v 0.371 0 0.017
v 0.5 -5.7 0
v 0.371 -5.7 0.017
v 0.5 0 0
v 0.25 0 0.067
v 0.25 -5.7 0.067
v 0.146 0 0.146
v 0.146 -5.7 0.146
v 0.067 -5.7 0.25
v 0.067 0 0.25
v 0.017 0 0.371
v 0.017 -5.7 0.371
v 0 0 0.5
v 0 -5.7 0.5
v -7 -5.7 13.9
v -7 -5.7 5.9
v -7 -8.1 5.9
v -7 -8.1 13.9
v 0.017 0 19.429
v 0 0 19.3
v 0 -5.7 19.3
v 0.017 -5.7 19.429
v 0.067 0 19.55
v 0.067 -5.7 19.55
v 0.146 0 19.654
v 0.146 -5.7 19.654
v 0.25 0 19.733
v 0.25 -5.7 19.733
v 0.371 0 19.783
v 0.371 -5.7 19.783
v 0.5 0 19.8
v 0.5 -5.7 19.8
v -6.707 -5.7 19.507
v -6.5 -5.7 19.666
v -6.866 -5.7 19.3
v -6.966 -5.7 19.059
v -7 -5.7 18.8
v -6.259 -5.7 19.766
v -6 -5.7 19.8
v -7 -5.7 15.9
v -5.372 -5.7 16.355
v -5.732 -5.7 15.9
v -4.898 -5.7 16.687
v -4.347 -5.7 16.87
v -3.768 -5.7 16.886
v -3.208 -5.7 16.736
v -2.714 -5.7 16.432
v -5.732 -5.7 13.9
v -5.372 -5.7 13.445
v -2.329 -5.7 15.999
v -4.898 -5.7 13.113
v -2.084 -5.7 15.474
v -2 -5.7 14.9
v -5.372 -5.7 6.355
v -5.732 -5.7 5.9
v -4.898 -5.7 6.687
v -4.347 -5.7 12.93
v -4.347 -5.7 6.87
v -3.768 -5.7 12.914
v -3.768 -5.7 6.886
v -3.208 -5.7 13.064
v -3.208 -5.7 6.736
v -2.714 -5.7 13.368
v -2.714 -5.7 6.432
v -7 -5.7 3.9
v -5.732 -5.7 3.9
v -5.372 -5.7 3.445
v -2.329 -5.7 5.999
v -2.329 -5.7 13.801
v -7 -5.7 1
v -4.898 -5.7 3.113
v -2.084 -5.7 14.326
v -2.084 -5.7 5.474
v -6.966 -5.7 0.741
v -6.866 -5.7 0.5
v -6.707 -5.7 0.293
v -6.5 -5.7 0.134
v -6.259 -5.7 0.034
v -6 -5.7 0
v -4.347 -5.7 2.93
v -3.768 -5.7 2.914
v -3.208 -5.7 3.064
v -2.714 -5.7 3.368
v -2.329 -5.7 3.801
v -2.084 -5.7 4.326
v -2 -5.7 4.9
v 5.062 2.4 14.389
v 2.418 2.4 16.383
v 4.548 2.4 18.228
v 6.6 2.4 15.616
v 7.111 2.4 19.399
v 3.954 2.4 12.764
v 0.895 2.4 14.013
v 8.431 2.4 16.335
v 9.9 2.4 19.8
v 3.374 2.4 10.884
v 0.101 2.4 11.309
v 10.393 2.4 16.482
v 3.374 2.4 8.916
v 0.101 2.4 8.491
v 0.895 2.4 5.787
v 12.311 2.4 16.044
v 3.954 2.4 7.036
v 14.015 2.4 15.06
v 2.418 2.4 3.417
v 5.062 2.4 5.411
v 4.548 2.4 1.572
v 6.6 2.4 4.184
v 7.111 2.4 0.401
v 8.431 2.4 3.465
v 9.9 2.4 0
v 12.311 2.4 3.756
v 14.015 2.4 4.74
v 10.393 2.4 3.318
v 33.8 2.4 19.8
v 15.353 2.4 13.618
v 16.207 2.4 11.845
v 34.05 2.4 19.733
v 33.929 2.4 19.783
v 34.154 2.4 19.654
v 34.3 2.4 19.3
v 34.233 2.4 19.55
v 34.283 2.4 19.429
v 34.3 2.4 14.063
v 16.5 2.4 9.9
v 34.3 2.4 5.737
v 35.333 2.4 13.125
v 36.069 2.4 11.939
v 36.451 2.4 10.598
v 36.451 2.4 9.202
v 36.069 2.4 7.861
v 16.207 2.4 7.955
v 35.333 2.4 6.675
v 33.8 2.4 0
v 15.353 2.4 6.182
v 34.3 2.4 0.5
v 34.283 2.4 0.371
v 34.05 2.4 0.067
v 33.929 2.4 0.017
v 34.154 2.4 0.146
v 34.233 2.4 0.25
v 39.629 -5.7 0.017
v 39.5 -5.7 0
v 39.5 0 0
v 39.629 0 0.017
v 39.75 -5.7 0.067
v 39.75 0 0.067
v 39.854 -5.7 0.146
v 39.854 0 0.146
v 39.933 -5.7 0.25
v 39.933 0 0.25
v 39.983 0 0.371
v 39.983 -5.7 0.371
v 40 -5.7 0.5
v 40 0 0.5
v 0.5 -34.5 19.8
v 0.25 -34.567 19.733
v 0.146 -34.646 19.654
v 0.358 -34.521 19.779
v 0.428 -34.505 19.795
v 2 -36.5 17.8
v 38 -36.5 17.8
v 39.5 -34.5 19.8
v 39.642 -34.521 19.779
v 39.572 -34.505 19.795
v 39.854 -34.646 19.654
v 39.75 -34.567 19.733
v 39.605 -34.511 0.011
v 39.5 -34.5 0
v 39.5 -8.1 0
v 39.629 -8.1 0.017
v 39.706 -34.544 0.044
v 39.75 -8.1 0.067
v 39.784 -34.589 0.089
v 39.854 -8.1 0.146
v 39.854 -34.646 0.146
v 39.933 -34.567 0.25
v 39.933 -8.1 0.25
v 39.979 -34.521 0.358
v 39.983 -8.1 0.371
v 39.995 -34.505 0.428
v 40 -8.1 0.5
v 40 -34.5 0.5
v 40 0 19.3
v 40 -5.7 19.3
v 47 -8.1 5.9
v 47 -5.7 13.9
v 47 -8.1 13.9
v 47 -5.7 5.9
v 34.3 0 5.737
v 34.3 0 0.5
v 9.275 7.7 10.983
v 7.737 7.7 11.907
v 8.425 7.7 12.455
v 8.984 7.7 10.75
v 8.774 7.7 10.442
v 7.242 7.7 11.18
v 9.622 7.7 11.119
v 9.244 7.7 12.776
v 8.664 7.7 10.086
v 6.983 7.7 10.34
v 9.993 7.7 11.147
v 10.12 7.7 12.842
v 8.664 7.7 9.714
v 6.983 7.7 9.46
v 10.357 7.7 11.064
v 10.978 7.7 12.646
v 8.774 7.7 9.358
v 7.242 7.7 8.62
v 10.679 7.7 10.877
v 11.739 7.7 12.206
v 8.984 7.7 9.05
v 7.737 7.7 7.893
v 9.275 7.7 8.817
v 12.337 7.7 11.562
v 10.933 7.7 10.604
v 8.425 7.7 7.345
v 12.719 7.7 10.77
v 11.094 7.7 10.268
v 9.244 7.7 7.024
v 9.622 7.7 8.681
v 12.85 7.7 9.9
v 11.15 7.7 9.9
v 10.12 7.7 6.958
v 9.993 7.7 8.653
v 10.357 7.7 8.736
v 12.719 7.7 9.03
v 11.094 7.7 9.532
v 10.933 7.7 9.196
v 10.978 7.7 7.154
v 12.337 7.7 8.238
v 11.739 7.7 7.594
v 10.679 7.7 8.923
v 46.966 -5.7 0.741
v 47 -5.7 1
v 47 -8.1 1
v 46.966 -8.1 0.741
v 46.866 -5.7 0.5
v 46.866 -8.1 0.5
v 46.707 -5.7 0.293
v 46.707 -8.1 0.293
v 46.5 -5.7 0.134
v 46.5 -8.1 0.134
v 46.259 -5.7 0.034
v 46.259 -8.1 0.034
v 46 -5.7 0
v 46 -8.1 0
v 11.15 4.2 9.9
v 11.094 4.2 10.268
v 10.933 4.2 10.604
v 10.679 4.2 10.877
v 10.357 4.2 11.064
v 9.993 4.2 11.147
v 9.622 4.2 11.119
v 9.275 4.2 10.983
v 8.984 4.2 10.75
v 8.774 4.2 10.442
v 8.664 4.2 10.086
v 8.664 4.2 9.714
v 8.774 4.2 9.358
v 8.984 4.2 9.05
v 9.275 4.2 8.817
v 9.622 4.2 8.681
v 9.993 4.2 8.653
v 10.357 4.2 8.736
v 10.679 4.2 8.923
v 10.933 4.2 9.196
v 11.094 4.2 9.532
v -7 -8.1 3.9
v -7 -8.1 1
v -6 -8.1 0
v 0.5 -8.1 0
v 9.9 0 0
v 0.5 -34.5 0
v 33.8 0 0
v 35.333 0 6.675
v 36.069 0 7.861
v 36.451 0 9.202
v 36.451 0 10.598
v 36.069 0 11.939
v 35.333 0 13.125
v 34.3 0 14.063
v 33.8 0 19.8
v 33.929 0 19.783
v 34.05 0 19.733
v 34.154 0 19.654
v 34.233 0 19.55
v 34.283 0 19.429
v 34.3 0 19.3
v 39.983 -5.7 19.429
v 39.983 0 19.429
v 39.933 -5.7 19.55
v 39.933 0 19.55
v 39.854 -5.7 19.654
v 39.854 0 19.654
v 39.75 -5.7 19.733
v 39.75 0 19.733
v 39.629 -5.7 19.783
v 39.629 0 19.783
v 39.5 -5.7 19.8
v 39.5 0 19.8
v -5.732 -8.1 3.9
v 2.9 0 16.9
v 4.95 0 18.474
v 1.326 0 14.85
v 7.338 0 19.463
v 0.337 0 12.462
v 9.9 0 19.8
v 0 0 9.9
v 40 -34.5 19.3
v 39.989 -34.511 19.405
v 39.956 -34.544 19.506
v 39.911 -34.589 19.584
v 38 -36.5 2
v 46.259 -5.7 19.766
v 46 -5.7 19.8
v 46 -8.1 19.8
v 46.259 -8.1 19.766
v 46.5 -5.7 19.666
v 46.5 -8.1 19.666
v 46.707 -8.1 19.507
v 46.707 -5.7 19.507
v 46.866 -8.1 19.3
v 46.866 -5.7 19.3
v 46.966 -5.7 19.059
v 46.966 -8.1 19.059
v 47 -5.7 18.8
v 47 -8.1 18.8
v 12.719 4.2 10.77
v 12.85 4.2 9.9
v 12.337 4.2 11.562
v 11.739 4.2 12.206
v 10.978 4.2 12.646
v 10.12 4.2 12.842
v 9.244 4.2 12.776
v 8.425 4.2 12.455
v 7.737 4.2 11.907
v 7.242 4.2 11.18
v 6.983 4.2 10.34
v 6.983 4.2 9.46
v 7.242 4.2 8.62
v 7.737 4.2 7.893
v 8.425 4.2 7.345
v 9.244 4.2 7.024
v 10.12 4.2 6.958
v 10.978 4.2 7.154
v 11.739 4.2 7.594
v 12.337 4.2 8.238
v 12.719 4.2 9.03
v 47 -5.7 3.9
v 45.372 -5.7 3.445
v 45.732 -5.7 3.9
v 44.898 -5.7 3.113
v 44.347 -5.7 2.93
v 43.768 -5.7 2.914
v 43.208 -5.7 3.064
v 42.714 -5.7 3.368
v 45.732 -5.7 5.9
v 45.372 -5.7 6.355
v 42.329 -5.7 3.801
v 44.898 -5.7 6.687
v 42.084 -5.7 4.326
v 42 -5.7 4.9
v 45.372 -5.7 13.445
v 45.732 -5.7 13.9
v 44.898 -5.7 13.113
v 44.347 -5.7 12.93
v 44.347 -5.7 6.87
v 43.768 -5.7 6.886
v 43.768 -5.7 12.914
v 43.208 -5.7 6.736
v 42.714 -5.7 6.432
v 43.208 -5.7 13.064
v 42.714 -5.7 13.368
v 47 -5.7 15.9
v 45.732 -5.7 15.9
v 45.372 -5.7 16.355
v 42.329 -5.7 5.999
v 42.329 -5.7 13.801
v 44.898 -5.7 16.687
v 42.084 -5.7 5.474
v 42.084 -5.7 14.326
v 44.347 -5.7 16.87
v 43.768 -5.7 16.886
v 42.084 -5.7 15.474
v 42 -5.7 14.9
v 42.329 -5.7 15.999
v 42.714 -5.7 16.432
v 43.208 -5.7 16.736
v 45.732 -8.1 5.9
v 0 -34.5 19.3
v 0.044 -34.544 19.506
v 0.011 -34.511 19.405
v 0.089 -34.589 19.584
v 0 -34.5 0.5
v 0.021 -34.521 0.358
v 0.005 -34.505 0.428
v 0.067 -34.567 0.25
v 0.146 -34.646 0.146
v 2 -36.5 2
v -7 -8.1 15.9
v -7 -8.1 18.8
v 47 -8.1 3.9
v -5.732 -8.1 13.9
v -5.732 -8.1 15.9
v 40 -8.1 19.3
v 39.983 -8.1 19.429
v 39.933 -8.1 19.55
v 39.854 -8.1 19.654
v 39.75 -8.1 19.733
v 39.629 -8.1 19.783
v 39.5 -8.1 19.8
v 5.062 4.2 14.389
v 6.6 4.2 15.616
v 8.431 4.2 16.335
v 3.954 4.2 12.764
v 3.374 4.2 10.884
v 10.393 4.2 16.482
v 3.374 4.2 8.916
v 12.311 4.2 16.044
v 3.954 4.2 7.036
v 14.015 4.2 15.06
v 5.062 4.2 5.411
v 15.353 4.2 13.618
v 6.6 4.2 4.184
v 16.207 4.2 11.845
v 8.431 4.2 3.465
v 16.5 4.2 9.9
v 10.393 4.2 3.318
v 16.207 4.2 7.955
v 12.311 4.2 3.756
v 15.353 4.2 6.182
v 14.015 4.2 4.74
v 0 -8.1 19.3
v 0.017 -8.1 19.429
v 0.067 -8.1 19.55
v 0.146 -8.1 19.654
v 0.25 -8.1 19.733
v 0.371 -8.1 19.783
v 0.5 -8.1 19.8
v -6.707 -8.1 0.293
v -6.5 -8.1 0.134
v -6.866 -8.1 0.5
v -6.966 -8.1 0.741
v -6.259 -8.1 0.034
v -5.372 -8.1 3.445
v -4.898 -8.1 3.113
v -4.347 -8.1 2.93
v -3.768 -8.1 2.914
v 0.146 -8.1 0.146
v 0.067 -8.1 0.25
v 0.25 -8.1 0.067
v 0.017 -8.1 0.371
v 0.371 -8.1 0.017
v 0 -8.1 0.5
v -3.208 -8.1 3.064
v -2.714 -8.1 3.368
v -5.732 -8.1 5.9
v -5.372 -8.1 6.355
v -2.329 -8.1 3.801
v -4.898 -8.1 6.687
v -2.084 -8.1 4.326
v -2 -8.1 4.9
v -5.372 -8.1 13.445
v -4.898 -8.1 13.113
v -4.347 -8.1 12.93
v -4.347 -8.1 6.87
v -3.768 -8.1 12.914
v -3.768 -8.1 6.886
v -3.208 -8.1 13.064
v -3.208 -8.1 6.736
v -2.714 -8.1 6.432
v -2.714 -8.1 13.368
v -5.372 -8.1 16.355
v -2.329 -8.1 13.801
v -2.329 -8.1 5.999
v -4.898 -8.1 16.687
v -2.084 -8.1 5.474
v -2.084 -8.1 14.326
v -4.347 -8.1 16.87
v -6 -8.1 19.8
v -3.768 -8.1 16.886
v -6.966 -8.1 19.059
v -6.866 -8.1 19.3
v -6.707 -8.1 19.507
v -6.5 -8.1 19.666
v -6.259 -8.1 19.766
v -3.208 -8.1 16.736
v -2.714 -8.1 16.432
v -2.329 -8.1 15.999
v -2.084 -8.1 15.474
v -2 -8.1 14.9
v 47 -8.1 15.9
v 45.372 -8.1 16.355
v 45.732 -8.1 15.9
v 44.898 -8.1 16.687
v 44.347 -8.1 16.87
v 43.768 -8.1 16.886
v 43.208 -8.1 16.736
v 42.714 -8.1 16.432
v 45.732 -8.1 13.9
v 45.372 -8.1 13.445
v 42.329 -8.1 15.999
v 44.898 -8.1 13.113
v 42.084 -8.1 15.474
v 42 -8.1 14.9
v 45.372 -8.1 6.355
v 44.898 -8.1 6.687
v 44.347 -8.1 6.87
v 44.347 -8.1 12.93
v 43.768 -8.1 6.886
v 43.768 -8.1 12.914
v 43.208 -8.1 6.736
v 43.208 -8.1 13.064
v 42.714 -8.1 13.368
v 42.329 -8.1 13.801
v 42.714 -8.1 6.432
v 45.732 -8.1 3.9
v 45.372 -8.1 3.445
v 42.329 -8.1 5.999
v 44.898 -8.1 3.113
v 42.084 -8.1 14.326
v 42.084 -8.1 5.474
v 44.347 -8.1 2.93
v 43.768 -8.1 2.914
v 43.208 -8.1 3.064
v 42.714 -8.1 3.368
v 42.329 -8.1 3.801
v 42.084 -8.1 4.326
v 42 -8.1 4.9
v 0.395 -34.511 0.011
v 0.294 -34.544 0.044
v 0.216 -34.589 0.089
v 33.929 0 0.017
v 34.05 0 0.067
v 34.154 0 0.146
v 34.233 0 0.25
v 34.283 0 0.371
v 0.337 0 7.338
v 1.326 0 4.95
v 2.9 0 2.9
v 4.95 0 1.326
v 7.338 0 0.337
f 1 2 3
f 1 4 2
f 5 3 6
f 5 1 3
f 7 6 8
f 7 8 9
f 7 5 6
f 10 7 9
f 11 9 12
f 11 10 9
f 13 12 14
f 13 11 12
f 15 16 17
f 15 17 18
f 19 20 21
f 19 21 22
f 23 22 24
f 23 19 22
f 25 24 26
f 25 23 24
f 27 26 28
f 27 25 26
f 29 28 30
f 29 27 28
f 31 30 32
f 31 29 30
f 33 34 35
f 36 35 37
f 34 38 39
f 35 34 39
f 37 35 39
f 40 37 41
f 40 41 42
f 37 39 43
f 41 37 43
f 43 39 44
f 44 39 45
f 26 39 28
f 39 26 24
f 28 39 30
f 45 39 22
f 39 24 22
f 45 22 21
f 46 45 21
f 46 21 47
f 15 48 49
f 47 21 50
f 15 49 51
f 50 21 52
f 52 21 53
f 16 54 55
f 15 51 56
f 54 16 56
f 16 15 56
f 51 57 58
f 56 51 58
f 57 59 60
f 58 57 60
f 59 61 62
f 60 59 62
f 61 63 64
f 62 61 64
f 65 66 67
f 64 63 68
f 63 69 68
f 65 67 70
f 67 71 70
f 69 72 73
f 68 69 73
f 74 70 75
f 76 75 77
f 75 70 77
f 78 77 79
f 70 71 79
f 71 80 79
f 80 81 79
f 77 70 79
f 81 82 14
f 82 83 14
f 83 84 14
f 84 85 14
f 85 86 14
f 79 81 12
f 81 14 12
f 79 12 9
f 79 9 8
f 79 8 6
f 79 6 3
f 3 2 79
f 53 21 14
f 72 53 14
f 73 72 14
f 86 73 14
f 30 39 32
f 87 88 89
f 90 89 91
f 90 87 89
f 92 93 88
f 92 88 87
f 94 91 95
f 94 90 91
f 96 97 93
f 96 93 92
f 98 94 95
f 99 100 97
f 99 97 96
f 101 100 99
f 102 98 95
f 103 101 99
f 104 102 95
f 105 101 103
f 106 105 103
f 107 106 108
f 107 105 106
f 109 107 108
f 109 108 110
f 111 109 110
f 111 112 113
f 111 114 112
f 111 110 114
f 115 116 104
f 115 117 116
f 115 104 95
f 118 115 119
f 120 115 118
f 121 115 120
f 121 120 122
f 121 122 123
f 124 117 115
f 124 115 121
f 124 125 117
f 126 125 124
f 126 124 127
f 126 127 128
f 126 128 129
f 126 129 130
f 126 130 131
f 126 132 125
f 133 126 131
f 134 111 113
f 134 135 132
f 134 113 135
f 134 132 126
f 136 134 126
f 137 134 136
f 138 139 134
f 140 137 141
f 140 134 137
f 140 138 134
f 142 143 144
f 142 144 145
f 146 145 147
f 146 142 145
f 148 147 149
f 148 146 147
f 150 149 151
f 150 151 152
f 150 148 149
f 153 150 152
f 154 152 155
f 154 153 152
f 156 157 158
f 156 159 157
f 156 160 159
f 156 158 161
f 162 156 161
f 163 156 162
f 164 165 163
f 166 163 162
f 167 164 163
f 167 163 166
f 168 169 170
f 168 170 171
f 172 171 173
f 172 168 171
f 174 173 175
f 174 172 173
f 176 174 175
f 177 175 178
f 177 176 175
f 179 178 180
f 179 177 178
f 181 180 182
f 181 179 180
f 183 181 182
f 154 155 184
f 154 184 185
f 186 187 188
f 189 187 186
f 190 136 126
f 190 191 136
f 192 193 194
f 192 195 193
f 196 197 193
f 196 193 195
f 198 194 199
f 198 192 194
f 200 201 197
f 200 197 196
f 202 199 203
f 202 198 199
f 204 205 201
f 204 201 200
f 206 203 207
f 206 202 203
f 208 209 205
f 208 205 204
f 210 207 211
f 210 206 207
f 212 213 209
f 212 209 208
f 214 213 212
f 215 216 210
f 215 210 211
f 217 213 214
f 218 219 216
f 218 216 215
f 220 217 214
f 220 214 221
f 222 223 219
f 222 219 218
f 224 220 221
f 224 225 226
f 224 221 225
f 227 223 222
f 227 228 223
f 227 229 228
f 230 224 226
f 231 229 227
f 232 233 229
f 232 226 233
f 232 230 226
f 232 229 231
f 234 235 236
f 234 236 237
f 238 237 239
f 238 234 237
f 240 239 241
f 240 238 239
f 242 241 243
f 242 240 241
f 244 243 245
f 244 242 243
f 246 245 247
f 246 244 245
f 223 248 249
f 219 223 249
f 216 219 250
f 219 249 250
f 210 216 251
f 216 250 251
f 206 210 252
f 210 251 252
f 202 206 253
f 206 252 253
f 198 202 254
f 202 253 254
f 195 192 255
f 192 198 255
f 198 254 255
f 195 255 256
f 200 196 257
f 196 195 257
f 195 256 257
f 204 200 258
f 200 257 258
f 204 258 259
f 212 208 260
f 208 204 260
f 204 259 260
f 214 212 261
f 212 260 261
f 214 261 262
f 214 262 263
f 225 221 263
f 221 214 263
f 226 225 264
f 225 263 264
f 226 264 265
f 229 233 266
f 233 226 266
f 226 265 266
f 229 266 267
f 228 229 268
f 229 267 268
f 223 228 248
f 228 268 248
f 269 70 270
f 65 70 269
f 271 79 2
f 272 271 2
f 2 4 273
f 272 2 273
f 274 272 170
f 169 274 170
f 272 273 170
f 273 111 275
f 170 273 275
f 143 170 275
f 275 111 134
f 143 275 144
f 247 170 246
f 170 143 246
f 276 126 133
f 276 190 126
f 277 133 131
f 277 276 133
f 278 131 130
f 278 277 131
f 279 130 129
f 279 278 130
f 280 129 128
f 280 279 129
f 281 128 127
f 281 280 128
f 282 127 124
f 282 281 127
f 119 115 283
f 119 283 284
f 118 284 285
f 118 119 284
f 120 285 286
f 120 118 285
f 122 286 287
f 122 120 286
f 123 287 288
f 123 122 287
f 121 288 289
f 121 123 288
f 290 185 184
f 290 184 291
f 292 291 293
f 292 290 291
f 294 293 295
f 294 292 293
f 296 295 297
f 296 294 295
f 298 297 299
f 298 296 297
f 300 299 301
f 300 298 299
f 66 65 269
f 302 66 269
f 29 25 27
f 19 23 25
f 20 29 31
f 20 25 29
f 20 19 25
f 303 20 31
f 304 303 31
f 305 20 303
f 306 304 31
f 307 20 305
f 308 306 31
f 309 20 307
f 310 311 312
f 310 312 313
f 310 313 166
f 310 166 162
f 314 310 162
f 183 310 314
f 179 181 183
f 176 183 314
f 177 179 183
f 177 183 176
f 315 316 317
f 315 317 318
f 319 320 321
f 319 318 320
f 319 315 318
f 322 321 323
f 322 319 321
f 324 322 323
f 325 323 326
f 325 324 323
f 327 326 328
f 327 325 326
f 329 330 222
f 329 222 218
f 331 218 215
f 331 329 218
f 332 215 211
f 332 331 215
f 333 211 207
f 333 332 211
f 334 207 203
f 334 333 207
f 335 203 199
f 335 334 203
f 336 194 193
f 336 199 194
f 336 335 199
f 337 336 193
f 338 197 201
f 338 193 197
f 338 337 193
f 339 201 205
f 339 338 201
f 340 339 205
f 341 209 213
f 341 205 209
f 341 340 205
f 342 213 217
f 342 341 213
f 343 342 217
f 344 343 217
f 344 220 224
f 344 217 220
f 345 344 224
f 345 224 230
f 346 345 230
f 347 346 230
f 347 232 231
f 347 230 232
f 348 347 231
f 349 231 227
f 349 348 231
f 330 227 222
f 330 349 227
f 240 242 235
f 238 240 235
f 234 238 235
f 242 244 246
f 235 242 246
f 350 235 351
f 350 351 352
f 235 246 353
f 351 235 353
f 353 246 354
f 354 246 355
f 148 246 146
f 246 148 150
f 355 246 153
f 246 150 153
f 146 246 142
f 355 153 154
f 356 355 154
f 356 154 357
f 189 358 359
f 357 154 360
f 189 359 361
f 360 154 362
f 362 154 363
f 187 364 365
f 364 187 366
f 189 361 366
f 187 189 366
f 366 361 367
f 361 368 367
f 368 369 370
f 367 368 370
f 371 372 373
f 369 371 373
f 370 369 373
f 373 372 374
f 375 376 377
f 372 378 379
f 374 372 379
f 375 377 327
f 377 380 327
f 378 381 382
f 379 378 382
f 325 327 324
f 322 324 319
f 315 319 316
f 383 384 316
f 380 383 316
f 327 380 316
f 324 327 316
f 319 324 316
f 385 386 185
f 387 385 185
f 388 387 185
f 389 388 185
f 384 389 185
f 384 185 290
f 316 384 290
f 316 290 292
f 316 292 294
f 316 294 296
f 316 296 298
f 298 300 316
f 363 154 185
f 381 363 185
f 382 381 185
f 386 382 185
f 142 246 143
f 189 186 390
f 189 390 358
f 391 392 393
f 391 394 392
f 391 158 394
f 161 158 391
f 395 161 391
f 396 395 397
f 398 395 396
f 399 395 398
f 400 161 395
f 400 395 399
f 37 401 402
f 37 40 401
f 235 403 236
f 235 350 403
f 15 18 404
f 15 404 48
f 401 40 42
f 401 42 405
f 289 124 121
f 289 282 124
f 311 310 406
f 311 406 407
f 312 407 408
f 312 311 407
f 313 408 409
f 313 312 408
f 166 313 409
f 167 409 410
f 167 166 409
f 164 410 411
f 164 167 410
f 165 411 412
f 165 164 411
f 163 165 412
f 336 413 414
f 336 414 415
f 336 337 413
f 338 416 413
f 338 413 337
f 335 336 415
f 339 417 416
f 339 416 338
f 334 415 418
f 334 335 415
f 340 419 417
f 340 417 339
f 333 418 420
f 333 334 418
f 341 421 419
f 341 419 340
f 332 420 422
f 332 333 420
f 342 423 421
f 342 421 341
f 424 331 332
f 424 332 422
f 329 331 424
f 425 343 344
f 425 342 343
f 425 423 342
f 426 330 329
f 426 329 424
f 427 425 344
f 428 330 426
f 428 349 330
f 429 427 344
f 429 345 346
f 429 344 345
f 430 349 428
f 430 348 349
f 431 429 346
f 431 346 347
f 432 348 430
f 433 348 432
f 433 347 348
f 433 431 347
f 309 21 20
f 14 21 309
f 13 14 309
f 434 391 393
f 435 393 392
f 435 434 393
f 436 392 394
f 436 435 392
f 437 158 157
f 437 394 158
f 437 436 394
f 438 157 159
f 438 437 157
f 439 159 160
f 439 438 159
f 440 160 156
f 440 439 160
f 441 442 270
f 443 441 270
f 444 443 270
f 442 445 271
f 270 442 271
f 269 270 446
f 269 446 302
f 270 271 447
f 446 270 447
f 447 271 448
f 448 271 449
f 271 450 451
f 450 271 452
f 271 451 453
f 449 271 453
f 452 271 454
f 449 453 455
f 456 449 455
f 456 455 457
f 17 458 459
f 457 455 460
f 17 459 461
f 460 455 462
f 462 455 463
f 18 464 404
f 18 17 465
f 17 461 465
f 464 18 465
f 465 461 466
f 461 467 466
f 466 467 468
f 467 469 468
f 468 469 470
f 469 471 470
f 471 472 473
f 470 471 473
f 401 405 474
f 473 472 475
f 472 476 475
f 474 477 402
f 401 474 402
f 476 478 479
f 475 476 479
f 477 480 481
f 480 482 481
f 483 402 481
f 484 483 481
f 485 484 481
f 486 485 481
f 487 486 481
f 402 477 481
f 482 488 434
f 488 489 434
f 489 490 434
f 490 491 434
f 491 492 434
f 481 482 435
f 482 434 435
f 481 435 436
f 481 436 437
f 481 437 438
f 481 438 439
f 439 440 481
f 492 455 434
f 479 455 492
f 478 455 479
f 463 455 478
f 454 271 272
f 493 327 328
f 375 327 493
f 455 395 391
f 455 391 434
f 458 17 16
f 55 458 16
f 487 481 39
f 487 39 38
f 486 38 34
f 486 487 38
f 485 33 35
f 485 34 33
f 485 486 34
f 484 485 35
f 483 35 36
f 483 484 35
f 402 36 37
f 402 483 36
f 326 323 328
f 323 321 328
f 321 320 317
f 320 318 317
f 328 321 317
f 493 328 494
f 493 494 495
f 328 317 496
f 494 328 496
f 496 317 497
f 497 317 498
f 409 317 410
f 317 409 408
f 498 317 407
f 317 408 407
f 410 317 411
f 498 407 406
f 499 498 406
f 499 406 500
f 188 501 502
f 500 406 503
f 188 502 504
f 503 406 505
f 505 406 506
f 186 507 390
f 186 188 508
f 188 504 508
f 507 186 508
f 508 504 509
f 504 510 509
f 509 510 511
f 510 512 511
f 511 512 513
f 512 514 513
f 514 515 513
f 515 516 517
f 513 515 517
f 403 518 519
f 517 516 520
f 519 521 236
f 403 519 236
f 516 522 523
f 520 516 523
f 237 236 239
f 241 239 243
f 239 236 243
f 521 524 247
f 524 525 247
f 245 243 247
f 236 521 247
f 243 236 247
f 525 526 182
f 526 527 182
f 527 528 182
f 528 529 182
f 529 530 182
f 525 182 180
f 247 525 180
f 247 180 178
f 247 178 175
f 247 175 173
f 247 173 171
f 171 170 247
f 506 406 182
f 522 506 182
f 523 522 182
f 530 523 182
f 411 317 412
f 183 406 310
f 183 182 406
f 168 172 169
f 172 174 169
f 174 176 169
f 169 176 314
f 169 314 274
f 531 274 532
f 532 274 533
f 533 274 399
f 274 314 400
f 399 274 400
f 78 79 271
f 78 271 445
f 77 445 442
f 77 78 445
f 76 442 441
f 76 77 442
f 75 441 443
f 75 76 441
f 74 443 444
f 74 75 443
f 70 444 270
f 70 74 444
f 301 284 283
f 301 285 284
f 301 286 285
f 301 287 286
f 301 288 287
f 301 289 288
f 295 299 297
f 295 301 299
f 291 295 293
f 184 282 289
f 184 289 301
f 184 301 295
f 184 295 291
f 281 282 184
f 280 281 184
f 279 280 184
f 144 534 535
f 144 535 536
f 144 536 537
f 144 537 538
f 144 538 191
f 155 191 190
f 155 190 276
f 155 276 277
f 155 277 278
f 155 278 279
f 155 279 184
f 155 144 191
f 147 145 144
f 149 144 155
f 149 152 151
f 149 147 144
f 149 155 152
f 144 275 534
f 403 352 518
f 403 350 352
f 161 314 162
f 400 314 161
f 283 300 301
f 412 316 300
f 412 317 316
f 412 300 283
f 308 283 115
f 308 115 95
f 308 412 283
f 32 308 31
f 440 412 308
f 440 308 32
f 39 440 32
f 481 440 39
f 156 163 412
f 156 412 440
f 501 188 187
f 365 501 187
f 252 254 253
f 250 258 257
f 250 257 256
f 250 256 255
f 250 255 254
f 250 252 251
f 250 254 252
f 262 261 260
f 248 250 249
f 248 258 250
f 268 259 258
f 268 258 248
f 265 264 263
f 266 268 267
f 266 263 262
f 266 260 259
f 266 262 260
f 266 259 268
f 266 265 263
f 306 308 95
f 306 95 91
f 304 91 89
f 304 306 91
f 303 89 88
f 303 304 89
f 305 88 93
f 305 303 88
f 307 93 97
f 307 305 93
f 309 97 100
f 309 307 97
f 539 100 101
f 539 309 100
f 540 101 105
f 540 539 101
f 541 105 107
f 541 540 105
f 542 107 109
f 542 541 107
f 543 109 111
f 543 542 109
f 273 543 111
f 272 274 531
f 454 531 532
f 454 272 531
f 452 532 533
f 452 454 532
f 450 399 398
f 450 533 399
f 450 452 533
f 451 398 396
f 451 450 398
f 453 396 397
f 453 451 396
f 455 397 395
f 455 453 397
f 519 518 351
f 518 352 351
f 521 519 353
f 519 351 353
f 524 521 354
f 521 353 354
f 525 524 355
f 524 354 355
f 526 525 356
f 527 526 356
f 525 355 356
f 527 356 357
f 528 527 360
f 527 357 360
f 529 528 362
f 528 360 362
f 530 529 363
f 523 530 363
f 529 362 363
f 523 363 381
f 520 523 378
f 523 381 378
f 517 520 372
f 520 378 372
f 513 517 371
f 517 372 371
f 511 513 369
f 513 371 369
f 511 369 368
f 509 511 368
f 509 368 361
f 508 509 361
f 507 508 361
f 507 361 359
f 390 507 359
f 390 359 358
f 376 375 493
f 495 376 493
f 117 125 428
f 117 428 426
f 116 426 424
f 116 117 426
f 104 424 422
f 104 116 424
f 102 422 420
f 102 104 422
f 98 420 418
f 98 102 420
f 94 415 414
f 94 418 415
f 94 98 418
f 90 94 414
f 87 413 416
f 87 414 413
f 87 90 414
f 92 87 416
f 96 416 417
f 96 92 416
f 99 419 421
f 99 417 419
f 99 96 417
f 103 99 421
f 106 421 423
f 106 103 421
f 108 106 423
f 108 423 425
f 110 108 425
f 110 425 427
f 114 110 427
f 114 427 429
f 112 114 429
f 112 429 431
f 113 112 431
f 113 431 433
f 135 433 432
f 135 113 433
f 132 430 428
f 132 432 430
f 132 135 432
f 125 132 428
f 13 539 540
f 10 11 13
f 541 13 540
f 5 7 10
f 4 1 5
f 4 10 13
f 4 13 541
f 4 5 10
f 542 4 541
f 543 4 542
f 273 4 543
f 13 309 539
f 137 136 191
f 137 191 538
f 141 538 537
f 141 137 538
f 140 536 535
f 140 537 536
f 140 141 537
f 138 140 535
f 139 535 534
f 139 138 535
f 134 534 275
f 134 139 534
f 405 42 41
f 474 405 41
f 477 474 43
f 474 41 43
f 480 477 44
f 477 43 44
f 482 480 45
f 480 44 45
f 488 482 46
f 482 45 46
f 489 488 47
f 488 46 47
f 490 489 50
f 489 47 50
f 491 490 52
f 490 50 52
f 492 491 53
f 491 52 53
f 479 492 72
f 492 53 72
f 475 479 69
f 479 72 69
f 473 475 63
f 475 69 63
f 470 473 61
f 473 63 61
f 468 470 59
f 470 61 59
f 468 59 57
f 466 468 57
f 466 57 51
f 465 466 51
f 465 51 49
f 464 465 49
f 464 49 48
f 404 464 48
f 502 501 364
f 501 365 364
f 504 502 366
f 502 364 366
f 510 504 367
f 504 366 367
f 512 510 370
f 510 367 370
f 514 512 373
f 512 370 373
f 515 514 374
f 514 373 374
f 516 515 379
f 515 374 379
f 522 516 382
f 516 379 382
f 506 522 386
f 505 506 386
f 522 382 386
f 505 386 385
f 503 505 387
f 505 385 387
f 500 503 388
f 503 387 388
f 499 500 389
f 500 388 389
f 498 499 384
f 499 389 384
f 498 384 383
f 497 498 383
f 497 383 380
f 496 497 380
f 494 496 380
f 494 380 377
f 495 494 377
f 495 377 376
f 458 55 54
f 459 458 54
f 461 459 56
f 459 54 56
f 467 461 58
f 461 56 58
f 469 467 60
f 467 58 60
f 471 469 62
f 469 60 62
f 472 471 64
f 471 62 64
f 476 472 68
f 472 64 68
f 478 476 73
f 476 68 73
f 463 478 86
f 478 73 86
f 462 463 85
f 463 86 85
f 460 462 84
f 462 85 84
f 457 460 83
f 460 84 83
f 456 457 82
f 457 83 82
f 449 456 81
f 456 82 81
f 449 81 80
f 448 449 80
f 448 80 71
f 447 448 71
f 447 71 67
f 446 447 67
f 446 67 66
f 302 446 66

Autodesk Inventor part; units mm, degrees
ref_plane "YZ Plane" through (0, 0, 0) normal (1, 0, 0) x (0, 1, 0)
ref_plane "XZ Plane" through (0, 0, 0) normal (0, 1, 0) x (-1, 0, 0)
ref_plane "XY Plane" through (0, 0, 0) normal (0, 0, 1) x (1, 0, 0)
sketch "Эскиз1" plane through (0, 0, 0) normal (0, 0, 1) x (1, 0, 0)
  line L0 (0, 0) -> (40, 0)
  line L1 (40, 0) -> (40, -36.5)
  line L2 (40, -36.5) -> (0, -36.5)
  line L3 (0, -36.5) -> (0, 0)
  dimension "d0" = 36.5
  dimension "d1" = 40
extrude "Выдавливание1" add sketch "Эскиз1" along normal blind 19.8
sketch "Эскиз2" plane through (0, 0, 0) normal (0, 1, 0) x (1, 0, 0)
  line L0 (0, 0) -> (0, -19.8) projected
  line L1 (40, 0) -> (0, 0) projected
  circle A0 centre (9.9, -9.9) radius 9.9
  line L2 (9.9, 0) -> (34.3, 0)
  line L3 (34.3, 0) -> (34.3, -19.8)
  line L4 (34.3, -19.8) -> (9.9, -19.8)
  line L5 (9.9, -19.8) -> (9.9, 0)
  line L6 (40, 0) -> (40, -19.8) projected
  circle A1 centre (31.4618, -9.9) radius 5.0382
  point P0 (0, -9.9)
  point P1 (36.5, -9.9)
  point P2 (9.9, 0)
  point P3 (9.9, -19.8)
  point P4 (34.3, -14.0627)
  point P5 (34.3, -5.7373)
  dimension "d4" = 9.9
  dimension "d5" = 9.9
  dimension "d6" = 5.7
  dimension "d7" = 3.5
extrude "Выдавливание2" add sketch "Эскиз2" along normal blind 2.4 contours A0 L5 | L1 L3 A1 L4 A0 | A0 L5 | A1 L3 | L3 A1
sketch "Эскиз3" plane through (0, 2.4, 0) normal (0, 1, 0) x (1, 0, 0)
  line L0 (0, -9.9) -> (0, -19.8) projected
  circle A0 centre (9.9, -9.9) radius 6.6
  point P0 (0, 0)
  point P1 (9.9, 0)
  dimension "d10" = 13.2
extrude "Выдавливание3" add sketch "Эскиз3" along normal blind 1.8
sketch "Эскиз4" plane through (9.9, 4.2, 9.9) normal (0, 1, 0) x (1, 0, 0)
  circle A0 centre (0, 0) radius 2.95
  circle A1 centre (0, 0) radius 1.25
  point P0 (-9.9, 9.9)
  dimension "d13" = 5.9
  dimension "d16" = 2.5
extrude "Выдавливание4" add sketch "Эскиз4" along normal blind 3.5
sketch "Эскиз5" plane through (40, -36.5, 0) normal (1, 0, 0) x (0, 0, -1)
  line L0 (-19.8, 0) -> (-19.8, 36.5) projected
  line L1 (0, 0) -> (0, 36.5) projected
  line L2 (-19.8, 28.4) -> (0, 28.4)
  line L3 (0, 28.4) -> (0, 30.8)
  line L4 (0, 30.8) -> (-19.8, 30.8)
  line L5 (-19.8, 30.8) -> (-19.8, 28.4)
  line L6 (0, 0) -> (-19.8, 0) projected
  point P0 (0, 28.4)
  dimension "d17" = 28.4
  dimension "d18" = 2.4
extrude "Выдавливание5" add sketch "Эскиз5" along normal blind 7 contours L0 L4 L1 L2
sketch "Эскиз6" plane through (0, -36.5, 0) normal (-1, 0, 0) x (0, 0, 1)
  line L0 (19.8, 30.8) -> (0, 30.8) projected
  line L1 (0, 28.4) -> (19.8, 28.4) projected
  line L2 (0, 30.8) -> (19.8, 30.8)
  line L3 (19.8, 30.8) -> (19.8, 28.4)
  line L4 (19.8, 28.4) -> (0, 28.4)
  line L5 (0, 28.4) -> (0, 30.8)
  point P0 (0, 36.5)
extrude "Выдавливание6" add sketch "Эскиз6" along normal blind 7
sketch "Эскиз7" plane through (0, -5.7, 19.8) normal (0, 1, 0) x (1, 0, 0)
  line L0 (-7, 0) -> (-7, 19.8) projected
  circle A0 centre (-4, 14.9) radius 2
  circle A1 centre (44, 14.9) radius 2
  line L1 (47, 19.8) -> (47, 0) projected
  circle A2 centre (-4, 4.9) radius 2
  circle A3 centre (44, 4.9) radius 2
  point P0 (0, 19.8)
  point P1 (-7, 9.9)
  dimension "d23" = 4
  dimension "d24" = 5
  dimension "d25" = 3
  dimension "d26" = 4
  dimension "d27" = 48
  dimension "d28" = 3
  dimension "d29" = 4
  dimension "d30" = 5
extrude "Выдавливание7" cut sketch "Эскиз7" against normal blind 10
fillet "Сопряжение1" radius 1 4 edges at (-7, -6.9, 19.8) (-7, -6.9, 0) (47, -6.9, 19.8) (47, -6.9, 0)
chamfer "Фаска1" distance 2 angle 45 4 edges at (20, -36.5, 0) (0, -36.5, 9.9) (20, -36.5, 19.8) (40, -36.5, 9.9)
fillet "Сопряжение3" radius 0.5 10 edges at (0, -21.3, 0) (0, -21.3, 19.8) (0, -2.85, 0) (0, -2.85, 19.8) (40, -21.3, 0) (40, -2.85, 0) (34.3, 1.2, 0) (34.3, 1.2, 19.8) (40, -2.85, 19.8) (40, -21.3, 19.8)
sketch "Эскиз8" plane through (47, -36.5, 0) normal (1, 0, 0) x (0, 0, -1)
  line L0 (-0.5, 30.8) -> (-19.3, 30.8) projected
  line L1 (-19.3, 28.4) -> (-0.5, 28.4) projected
  line L2 (-13.9, 30.8) -> (-15.9, 30.8)
  line L3 (-15.9, 30.8) -> (-15.9, 28.4)
  line L4 (-15.9, 28.4) -> (-13.9, 28.4)
  line L5 (-13.9, 28.4) -> (-13.9, 30.8)
  line L6 (-1, 30.8) -> (-18.8, 30.8) projected
  line L7 (-18.8, 28.4) -> (-1, 28.4) projected
  line L8 (-5.9, 30.8) -> (-3.9, 30.8)
  line L9 (-3.9, 30.8) -> (-3.9, 28.4)
  line L10 (-3.9, 28.4) -> (-5.9, 28.4)
  line L11 (-5.9, 28.4) -> (-5.9, 30.8)
  point P0 (0, 36.5)
  point P1 (-9.9, 30.8)
  point P2 (-14.9, 31.074)
  point P3 (-4.9, 31.074)
  point P4 (-14.9, 30.8)
  dimension "d39" = 5
  dimension "d40" = 1
  dimension "d41" = 4
  dimension "d42" = 4
  dimension "d43" = 6
extrude "Выдавливание8" cut sketch "Эскиз8" against normal blind 2 contours L9 L1 L11 L0 | L5 L1 L3 L0
sketch "Эскиз9" plane through (-7, -36.5, 0) normal (-1, 0, 0) x (0, 0, 1)
  line L0 (18.8, 30.8) -> (1, 30.8) projected
  line L1 (1, 28.4) -> (18.8, 28.4) projected
  line L2 (5.9, 30.8) -> (3.9, 30.8)
  line L3 (3.9, 30.8) -> (3.9, 28.4)
  line L4 (3.9, 28.4) -> (5.9, 28.4)
  line L5 (5.9, 28.4) -> (5.9, 30.8)
  line L6 (13.9, 30.8) -> (15.9, 30.8)
  line L7 (15.9, 30.8) -> (15.9, 28.4)
  line L8 (15.9, 28.4) -> (13.9, 28.4)
  line L9 (13.9, 28.4) -> (13.9, 30.8)
  point P0 (0, 36.5)
  point P1 (9.9, 30.8)
  dimension "d46" = 4
  dimension "d47" = 6
  dimension "d48" = 4
  dimension "d49" = 6
extrude "Выдавливание9" cut sketch "Эскиз9" against normal blind 2 contours L7 L1 L9 L0 | L5 L1 L3 L0
properties part number "MG996R" material "Чугун, литейный"
